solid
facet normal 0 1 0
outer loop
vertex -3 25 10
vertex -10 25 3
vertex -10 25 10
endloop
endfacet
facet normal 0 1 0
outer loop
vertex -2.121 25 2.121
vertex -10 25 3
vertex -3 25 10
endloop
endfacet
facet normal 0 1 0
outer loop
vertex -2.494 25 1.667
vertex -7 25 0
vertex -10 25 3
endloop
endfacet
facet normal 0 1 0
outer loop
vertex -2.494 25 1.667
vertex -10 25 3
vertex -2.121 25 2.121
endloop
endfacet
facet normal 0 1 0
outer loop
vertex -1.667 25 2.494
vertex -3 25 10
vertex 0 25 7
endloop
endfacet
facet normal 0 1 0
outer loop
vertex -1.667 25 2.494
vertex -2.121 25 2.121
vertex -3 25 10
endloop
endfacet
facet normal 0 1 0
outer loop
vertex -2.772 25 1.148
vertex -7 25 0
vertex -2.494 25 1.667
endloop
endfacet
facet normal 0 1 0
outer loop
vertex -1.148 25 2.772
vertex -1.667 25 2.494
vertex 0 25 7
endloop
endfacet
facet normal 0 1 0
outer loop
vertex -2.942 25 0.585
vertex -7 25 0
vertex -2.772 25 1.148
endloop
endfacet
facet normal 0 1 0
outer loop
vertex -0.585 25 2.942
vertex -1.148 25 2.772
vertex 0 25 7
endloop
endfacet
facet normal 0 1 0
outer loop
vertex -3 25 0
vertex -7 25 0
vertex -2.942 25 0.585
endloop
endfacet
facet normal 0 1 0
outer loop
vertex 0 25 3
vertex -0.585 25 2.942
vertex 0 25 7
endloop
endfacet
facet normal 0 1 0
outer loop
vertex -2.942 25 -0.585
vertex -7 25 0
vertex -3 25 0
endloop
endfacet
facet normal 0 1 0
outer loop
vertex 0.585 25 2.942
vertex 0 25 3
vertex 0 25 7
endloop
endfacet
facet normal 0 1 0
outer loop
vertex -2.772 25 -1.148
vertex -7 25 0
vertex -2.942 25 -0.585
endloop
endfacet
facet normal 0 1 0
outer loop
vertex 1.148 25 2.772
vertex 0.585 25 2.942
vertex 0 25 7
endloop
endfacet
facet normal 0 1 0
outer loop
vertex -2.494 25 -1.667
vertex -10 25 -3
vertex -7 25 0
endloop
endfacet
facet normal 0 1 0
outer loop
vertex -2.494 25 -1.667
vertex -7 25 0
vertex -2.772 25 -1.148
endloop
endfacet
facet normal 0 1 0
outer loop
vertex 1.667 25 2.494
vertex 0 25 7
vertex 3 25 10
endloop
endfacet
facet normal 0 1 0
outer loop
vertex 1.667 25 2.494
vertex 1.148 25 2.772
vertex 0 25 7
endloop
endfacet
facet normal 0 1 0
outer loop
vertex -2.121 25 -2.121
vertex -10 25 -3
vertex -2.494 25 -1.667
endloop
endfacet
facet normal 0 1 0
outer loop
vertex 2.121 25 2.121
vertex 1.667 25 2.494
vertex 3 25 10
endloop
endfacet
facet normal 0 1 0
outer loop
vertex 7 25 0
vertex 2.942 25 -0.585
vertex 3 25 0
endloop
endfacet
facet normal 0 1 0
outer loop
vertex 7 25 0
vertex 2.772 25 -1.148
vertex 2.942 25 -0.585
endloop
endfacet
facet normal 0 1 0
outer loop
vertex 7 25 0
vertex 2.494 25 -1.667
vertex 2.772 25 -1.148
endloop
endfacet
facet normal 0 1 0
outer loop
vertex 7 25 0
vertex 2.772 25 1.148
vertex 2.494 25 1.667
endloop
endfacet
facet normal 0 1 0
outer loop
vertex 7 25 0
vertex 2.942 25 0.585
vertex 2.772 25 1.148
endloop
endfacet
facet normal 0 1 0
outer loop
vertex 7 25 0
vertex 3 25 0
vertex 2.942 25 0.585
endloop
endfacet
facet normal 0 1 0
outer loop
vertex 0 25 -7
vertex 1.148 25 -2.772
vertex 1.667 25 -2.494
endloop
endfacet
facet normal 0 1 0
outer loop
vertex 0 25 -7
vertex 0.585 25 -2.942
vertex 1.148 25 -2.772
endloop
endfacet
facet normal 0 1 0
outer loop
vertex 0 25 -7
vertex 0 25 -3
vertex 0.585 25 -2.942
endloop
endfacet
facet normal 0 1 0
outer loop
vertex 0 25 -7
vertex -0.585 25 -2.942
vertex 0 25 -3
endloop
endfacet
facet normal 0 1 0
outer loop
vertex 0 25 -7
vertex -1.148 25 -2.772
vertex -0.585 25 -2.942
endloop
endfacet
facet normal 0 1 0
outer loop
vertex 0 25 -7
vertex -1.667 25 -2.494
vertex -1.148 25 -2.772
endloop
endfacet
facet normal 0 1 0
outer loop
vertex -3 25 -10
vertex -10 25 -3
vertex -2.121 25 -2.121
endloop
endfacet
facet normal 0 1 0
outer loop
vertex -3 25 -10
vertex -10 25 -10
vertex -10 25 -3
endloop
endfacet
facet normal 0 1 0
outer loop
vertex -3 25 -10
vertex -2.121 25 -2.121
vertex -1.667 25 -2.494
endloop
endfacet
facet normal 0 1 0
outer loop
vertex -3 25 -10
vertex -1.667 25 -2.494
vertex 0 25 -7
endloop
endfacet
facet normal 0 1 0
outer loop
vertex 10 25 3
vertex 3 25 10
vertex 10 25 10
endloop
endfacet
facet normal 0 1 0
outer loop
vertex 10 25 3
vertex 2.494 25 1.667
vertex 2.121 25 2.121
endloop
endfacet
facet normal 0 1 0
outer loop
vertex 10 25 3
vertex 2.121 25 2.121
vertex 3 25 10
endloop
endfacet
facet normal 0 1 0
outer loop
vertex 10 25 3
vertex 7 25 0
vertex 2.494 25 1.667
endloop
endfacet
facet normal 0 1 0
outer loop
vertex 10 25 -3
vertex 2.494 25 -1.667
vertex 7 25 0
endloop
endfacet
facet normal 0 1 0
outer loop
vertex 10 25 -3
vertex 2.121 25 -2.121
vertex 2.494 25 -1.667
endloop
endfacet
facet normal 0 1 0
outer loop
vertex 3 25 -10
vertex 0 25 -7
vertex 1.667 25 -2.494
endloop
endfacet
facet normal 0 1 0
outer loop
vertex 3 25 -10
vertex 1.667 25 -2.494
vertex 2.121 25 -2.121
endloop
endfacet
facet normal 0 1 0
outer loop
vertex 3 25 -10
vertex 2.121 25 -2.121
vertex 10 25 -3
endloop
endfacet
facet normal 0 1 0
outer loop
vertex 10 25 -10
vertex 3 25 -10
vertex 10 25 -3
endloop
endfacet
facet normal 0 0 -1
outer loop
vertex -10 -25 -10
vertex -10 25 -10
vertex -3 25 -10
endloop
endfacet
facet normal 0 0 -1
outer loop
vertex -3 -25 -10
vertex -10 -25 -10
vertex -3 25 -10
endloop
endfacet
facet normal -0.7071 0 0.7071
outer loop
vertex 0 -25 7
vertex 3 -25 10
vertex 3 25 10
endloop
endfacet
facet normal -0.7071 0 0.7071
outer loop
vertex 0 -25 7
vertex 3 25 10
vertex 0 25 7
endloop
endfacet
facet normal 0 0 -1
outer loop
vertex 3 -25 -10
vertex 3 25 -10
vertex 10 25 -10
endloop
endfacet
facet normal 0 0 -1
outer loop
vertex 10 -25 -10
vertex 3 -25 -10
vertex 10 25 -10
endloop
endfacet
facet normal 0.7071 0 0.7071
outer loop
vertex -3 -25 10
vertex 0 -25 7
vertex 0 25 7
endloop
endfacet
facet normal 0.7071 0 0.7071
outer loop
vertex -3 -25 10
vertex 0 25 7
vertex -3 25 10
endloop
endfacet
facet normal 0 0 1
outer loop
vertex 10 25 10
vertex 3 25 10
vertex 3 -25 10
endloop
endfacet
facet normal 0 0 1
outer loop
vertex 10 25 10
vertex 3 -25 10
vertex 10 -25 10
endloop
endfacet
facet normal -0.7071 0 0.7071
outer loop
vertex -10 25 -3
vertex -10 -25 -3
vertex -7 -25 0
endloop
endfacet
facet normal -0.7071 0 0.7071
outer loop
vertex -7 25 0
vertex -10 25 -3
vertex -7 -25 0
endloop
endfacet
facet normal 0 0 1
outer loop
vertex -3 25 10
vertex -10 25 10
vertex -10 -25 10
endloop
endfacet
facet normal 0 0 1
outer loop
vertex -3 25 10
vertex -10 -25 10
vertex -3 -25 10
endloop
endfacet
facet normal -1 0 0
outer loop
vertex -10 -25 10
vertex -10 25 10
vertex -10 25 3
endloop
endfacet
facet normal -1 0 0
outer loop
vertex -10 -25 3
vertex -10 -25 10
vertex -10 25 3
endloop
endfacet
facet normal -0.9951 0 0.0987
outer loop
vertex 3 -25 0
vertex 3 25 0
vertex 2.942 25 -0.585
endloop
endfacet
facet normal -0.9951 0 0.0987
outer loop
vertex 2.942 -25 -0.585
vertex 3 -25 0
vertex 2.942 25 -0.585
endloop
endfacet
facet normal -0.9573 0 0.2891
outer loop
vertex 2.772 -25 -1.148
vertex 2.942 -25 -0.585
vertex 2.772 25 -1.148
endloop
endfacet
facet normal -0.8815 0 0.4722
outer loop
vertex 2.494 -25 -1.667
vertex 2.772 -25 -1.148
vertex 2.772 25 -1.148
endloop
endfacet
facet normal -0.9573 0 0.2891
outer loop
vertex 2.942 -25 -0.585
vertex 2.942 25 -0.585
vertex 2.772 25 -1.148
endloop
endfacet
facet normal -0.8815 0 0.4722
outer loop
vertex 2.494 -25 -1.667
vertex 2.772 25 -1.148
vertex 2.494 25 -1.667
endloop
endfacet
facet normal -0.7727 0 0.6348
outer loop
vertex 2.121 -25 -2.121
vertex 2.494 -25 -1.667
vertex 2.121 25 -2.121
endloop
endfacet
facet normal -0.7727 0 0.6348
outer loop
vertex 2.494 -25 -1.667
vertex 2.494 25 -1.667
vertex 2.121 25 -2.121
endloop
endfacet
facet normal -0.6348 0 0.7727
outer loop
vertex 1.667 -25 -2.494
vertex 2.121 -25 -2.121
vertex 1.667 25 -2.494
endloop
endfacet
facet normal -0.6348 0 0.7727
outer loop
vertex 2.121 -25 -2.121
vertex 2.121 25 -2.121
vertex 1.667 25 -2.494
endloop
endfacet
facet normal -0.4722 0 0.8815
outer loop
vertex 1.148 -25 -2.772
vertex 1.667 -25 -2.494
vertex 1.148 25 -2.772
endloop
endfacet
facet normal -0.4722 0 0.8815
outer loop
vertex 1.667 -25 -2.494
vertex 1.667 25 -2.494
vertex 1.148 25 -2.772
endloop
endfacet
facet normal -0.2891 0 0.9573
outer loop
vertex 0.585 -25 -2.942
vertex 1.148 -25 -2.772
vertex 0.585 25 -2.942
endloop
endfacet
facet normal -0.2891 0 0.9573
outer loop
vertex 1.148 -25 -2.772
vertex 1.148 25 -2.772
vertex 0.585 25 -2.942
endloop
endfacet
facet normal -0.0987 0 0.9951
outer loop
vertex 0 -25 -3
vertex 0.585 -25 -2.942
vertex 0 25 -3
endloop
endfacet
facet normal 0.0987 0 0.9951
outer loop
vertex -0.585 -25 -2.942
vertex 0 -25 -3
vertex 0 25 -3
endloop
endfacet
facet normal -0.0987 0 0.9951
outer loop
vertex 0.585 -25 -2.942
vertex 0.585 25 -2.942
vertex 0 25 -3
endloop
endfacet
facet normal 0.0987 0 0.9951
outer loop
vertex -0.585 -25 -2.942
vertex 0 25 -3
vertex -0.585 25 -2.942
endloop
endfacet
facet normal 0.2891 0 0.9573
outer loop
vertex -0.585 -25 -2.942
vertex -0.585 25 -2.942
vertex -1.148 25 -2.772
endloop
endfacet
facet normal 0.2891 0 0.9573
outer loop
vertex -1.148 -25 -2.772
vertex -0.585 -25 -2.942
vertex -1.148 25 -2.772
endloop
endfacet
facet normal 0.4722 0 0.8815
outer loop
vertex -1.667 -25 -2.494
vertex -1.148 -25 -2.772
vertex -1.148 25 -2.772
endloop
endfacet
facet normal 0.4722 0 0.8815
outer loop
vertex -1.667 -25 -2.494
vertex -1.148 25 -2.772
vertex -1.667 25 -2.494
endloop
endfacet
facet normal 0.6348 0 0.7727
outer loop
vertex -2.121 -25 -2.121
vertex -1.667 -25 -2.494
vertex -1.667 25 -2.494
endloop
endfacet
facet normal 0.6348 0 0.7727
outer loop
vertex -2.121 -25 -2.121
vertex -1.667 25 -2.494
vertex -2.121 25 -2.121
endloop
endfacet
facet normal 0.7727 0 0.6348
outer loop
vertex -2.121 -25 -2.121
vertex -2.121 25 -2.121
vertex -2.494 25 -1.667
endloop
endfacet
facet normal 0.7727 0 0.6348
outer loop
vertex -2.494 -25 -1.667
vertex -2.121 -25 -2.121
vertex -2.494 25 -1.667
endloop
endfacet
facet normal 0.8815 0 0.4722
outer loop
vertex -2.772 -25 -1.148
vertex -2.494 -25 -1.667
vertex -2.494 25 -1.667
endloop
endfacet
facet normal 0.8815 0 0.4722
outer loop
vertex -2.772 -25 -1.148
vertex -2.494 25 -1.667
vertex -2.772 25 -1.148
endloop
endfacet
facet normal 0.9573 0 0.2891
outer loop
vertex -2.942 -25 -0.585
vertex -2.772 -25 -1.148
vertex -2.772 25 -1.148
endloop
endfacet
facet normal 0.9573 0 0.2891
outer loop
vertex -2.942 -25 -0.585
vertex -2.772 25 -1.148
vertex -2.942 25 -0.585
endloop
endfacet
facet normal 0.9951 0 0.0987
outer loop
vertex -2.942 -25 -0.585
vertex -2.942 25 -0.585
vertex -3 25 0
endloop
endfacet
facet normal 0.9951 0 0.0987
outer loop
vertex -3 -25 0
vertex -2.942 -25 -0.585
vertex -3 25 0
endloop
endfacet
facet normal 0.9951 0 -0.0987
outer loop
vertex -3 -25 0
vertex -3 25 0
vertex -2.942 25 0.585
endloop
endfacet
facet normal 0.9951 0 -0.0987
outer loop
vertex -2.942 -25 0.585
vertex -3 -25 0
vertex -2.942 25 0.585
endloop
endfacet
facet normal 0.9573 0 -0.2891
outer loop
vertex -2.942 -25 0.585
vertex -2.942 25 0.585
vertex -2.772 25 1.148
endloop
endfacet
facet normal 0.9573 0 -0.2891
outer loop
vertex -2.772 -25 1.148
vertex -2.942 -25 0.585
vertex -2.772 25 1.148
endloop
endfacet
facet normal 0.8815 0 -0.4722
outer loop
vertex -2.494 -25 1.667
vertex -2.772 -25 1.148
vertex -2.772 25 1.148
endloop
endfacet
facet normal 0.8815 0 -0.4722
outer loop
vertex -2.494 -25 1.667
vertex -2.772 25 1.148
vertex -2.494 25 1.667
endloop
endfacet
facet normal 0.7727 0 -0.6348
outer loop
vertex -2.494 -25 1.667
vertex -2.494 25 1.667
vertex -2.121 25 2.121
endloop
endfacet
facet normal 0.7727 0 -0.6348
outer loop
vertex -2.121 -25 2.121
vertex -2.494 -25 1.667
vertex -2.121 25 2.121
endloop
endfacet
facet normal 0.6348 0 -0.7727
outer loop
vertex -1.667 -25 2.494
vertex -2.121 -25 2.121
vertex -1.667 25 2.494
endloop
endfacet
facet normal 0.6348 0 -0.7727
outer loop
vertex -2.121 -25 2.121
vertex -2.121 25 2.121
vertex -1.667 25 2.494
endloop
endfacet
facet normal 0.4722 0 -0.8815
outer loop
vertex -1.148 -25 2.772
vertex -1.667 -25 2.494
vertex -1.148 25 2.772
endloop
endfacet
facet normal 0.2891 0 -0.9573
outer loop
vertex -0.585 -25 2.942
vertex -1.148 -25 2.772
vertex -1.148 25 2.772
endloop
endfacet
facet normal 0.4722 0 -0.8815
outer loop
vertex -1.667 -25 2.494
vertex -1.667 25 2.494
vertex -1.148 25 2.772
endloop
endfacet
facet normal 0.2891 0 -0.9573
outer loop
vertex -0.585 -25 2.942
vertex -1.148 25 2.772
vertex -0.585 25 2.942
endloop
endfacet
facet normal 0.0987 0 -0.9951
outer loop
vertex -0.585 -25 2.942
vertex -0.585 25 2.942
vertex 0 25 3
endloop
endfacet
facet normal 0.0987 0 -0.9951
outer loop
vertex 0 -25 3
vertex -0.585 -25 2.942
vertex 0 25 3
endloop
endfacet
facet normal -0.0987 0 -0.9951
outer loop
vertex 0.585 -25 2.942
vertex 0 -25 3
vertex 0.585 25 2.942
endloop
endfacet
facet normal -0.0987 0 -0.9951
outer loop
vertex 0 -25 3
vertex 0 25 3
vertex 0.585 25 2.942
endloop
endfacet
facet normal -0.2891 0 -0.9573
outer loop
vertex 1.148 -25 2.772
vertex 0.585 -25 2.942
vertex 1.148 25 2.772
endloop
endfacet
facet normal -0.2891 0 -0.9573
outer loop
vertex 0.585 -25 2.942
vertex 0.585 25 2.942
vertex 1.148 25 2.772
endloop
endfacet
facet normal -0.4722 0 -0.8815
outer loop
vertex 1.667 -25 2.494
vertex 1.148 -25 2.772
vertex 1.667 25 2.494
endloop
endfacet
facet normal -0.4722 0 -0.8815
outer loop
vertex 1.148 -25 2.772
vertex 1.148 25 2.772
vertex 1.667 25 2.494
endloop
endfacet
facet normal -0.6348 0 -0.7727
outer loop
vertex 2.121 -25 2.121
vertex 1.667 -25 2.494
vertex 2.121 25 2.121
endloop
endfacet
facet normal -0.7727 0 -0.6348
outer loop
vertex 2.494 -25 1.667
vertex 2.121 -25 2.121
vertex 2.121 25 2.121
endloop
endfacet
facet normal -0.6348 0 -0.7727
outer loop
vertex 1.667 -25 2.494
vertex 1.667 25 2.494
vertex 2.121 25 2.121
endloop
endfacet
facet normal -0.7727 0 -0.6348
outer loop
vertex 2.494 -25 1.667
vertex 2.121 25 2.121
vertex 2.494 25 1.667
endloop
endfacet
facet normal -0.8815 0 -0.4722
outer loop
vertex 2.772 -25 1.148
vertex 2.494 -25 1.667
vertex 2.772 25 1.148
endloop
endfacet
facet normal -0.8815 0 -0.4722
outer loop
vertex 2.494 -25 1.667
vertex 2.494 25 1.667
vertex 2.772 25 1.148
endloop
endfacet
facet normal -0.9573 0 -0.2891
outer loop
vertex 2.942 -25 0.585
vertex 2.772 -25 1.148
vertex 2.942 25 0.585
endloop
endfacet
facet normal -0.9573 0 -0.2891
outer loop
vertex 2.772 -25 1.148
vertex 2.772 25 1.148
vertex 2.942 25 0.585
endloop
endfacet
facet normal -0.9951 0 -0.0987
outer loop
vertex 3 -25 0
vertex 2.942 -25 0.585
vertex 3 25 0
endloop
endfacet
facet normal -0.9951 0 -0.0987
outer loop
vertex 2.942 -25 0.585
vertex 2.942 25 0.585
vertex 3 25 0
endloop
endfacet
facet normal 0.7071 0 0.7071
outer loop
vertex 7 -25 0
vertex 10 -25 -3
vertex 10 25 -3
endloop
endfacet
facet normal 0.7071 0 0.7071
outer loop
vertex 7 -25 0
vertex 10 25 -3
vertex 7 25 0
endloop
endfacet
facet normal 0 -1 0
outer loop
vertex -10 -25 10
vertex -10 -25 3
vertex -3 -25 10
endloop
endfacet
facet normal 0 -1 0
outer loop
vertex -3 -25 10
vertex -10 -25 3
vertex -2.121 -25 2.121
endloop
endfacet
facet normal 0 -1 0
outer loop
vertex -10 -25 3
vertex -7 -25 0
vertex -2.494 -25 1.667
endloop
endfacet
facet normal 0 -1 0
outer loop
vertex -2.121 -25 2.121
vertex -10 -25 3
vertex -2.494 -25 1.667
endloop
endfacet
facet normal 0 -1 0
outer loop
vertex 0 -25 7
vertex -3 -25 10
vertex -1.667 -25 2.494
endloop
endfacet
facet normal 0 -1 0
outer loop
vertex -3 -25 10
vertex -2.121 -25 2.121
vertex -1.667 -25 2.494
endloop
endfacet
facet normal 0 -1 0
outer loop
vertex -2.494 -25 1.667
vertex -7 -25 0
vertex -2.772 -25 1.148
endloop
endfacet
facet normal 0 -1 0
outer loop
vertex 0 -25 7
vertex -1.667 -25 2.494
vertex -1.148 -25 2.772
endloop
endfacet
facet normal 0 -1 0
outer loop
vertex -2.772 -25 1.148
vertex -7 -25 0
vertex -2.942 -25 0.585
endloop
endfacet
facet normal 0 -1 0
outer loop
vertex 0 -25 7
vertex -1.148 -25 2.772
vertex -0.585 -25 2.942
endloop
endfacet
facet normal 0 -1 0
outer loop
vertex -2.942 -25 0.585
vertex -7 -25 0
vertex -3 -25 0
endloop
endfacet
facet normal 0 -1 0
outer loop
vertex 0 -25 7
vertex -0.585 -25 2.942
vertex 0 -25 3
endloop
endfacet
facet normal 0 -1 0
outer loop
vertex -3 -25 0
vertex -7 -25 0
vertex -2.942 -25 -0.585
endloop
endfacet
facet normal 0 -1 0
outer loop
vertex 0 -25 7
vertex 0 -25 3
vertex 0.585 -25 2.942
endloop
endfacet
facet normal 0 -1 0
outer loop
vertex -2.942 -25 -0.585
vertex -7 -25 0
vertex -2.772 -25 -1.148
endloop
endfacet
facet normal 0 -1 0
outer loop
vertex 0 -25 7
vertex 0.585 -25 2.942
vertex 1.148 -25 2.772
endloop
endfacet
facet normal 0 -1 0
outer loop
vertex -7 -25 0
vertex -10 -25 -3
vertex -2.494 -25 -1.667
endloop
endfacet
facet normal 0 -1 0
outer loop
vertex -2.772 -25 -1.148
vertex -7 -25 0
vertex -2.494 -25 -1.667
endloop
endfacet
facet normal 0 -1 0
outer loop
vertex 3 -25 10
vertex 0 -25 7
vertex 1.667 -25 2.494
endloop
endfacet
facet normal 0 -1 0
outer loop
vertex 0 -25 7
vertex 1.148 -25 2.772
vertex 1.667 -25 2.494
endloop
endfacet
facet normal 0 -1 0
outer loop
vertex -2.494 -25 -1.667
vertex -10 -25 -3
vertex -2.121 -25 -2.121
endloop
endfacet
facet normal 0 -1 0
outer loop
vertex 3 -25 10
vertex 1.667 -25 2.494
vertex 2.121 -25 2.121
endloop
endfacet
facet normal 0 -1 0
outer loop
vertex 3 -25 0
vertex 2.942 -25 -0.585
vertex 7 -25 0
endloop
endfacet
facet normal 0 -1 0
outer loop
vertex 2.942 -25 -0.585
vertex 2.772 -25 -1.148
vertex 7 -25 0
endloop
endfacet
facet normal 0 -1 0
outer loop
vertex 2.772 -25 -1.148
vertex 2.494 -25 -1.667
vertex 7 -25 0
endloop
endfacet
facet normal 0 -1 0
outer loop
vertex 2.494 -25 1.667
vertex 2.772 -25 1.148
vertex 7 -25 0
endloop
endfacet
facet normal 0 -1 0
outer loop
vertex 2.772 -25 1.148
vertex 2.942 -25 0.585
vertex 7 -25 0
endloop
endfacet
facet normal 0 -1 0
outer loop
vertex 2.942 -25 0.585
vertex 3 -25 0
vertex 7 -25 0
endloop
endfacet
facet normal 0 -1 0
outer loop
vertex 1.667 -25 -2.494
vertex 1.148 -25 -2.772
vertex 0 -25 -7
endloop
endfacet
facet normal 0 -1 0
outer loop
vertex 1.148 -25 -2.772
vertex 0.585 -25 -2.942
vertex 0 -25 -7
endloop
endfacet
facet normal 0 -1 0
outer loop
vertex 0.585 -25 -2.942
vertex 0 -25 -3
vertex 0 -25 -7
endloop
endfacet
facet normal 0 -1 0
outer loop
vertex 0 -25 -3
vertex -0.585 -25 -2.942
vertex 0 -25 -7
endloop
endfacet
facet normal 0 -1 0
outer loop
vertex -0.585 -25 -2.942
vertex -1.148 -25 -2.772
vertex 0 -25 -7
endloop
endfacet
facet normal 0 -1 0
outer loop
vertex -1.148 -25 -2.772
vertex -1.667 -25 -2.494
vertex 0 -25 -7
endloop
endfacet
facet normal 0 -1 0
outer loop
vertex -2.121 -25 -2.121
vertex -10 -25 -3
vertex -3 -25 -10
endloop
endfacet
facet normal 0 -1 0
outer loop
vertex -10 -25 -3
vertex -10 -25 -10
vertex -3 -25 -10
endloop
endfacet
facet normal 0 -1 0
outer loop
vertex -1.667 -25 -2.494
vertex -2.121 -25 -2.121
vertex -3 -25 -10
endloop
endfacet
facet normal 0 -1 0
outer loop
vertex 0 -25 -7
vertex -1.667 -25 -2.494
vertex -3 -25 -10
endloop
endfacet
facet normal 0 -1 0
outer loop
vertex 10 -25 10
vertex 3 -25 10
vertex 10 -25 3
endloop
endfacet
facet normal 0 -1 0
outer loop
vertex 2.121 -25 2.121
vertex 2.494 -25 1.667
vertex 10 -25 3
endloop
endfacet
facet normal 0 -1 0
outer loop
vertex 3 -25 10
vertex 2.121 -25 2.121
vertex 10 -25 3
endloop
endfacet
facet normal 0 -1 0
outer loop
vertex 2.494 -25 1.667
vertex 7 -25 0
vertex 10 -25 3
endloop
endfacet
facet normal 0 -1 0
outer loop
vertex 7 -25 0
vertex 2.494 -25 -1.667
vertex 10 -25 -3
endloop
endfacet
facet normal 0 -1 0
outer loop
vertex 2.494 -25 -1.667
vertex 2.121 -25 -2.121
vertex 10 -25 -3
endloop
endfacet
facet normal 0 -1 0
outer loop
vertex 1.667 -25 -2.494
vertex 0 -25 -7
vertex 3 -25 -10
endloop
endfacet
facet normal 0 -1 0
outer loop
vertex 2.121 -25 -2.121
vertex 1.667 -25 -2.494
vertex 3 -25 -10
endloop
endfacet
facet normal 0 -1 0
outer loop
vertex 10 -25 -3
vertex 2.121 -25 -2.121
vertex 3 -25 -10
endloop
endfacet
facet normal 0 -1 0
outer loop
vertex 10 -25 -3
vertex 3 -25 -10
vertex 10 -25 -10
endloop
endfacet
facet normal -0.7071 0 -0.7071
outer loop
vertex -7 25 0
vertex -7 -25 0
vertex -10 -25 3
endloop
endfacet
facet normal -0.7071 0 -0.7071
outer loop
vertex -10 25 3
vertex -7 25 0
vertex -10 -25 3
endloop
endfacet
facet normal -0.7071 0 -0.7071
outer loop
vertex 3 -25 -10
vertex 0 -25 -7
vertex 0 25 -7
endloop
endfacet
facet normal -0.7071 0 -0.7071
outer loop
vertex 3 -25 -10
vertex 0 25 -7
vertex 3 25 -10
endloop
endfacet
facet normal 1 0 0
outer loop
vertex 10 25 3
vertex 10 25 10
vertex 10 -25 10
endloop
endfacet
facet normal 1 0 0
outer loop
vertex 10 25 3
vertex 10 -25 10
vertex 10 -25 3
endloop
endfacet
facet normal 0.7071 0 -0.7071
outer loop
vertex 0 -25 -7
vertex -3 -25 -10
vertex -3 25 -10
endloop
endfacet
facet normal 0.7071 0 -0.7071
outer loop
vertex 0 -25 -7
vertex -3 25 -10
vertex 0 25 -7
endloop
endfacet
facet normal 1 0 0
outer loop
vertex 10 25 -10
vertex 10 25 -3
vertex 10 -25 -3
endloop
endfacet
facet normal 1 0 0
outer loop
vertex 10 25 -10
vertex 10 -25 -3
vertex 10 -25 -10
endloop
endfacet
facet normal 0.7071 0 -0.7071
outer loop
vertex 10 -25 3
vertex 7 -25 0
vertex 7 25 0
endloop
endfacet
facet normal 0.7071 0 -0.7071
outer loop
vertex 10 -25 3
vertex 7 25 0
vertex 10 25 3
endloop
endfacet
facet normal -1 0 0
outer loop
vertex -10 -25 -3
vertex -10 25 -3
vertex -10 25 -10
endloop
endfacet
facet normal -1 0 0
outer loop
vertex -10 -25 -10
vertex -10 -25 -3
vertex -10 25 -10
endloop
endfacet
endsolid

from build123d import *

# Parameters (mm, degrees)
SKIZZE1_W                       = 20
SKIZZE1_H                       = 20
AUFSATZ_LINEAR_AUSTRAGEN1_DEPTH = 25
SCHNITT_LINEAR_AUSTRAGEN1_DEPTH = 51
SKIZZE3_R                       = 3
SCHNITT_LINEAR_AUSTRAGEN2_DEPTH = 51


with BuildPart() as part:
    # Skizze1 → Aufsatz-Linear austragen1 (new body, symmetric)
    with BuildSketch(Plane(origin=(0, 0, 0), x_dir=(1, 0, 0), z_dir=(0, 1, 0))):
        Rectangle(SKIZZE1_W, SKIZZE1_H)
    extrude(amount=AUFSATZ_LINEAR_AUSTRAGEN1_DEPTH, both=True)

    # Skizze2 → Schnitt-Linear austragen1 (cut, through all)
    with BuildSketch(Plane(origin=(0, 25, 0), x_dir=(1, 0, 0), z_dir=(0, 1, 0))):
        Polygon((-3, 10), (0, 7), (3, 10), align=None)
        Polygon((10, 3), (7, 0), (10, -3), align=None)
        Polygon((-10, -3), (-10, 3), (-7, 0), align=None)
        Polygon((-3, -10), (3, -10), (0, -7), align=None)
    extrude(amount=-SCHNITT_LINEAR_AUSTRAGEN1_DEPTH, mode=Mode.SUBTRACT)

    # Skizze3 → Schnitt-Linear austragen2 (cut, through all)
    with BuildSketch(Plane(origin=(0, 25, 0), x_dir=(1, 0, 0), z_dir=(0, 1, 0))):
        Circle(SKIZZE3_R)
    extrude(amount=-SCHNITT_LINEAR_AUSTRAGEN2_DEPTH, mode=Mode.SUBTRACT)


solid = part.part
